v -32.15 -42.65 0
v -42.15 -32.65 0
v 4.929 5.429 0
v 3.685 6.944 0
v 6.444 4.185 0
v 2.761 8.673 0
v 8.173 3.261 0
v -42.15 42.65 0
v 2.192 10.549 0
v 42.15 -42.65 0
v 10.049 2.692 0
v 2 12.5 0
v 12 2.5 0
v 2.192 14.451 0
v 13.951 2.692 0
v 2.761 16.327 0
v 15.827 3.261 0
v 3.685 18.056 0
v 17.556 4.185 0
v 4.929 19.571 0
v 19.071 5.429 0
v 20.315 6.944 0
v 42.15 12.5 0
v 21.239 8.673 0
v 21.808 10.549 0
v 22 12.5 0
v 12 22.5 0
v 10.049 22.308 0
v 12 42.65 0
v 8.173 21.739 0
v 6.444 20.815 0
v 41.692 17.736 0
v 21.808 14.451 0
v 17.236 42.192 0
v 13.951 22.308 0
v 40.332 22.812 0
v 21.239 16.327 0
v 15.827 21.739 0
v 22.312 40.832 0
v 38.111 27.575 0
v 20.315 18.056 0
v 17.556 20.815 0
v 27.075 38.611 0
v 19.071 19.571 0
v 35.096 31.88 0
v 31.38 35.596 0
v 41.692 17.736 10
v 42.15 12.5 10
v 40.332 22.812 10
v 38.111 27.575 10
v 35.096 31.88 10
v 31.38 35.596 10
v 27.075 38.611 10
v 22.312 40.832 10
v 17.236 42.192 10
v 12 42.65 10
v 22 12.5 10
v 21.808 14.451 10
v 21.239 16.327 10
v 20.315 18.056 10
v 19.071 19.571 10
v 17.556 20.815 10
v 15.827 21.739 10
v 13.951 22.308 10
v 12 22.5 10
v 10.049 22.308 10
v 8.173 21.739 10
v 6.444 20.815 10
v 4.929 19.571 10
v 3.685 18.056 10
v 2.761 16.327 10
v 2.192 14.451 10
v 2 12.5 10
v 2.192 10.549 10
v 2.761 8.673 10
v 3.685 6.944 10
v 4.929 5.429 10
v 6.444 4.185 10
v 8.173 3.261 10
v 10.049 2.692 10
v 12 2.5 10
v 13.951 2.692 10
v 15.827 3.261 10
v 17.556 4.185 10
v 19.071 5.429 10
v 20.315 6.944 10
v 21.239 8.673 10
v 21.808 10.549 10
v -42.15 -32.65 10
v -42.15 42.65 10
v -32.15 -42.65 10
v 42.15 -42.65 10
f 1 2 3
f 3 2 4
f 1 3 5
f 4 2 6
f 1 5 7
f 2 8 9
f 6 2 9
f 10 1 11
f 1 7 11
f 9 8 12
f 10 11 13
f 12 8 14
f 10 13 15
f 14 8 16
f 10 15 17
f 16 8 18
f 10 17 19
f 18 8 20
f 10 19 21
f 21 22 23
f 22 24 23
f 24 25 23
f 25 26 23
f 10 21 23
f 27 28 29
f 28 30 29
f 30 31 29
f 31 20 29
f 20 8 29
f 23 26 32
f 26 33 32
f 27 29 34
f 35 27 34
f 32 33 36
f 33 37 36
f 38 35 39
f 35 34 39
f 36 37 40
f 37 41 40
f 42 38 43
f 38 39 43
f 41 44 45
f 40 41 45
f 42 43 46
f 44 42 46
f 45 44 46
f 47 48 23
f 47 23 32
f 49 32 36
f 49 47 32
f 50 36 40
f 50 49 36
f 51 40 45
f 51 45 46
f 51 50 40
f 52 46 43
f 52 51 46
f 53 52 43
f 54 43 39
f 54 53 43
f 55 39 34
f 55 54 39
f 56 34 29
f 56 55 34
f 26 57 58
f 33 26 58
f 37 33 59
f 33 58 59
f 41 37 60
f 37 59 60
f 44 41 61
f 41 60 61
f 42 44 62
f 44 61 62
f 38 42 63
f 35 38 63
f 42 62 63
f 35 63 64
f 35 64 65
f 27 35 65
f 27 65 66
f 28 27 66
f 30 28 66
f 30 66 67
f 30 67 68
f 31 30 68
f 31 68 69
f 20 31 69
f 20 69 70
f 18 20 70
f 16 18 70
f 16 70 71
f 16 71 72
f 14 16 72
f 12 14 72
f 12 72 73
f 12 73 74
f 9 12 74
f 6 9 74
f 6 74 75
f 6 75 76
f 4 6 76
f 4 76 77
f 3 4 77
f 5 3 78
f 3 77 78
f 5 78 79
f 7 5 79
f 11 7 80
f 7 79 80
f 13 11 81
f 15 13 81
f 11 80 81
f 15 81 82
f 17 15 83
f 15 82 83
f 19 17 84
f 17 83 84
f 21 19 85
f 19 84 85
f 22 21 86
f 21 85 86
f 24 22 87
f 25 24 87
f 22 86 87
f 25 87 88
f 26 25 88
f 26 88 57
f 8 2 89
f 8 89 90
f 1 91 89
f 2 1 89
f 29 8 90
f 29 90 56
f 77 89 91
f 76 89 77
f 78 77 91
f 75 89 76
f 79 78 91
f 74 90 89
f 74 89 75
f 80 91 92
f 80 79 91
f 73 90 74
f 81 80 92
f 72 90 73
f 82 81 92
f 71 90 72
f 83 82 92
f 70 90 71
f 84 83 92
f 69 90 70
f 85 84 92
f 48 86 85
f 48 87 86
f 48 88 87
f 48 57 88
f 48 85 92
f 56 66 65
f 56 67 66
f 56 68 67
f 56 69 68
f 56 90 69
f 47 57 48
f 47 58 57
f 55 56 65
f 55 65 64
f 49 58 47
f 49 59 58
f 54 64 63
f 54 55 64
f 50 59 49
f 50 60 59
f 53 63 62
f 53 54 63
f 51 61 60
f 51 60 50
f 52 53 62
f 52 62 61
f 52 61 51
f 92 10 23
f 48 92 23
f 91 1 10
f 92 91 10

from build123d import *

# Parameters (mm, degrees)
SKETCH_W     = 84.3
SKETCH_H     = 85.3
PAD_DEPTH    = 10
SKETCH001_R  = 10
POCKET_DEPTH = 10.001


with BuildPart() as part:
    # Sketch → Pad (new body)
    with BuildSketch(Plane.XY):
        Rectangle(SKETCH_W, SKETCH_H)
    extrude(amount=PAD_DEPTH)

    # Sketch001 (on Face6 of Pad) → Pocket (cut, through all)
    with BuildSketch(Plane.XY.offset(10)):
        with Locations((12, 12.5)):
            Circle(SKETCH001_R)
        Polygon((-42.15, -32.65), (-42.15, -42.65), (-32.15, -42.65), align=None)
        with BuildLine():
            ThreePointArc((42.15, 12.50004), (33.319274, 33.819265), (12.000052, 42.65))
            Line((12.000052, 42.65), (42.15, 84.3))
            Line((42.15, 84.3), (42.15, 12.50004))
        make_face()
    extrude(amount=-POCKET_DEPTH, mode=Mode.SUBTRACT)


solid = part.part
